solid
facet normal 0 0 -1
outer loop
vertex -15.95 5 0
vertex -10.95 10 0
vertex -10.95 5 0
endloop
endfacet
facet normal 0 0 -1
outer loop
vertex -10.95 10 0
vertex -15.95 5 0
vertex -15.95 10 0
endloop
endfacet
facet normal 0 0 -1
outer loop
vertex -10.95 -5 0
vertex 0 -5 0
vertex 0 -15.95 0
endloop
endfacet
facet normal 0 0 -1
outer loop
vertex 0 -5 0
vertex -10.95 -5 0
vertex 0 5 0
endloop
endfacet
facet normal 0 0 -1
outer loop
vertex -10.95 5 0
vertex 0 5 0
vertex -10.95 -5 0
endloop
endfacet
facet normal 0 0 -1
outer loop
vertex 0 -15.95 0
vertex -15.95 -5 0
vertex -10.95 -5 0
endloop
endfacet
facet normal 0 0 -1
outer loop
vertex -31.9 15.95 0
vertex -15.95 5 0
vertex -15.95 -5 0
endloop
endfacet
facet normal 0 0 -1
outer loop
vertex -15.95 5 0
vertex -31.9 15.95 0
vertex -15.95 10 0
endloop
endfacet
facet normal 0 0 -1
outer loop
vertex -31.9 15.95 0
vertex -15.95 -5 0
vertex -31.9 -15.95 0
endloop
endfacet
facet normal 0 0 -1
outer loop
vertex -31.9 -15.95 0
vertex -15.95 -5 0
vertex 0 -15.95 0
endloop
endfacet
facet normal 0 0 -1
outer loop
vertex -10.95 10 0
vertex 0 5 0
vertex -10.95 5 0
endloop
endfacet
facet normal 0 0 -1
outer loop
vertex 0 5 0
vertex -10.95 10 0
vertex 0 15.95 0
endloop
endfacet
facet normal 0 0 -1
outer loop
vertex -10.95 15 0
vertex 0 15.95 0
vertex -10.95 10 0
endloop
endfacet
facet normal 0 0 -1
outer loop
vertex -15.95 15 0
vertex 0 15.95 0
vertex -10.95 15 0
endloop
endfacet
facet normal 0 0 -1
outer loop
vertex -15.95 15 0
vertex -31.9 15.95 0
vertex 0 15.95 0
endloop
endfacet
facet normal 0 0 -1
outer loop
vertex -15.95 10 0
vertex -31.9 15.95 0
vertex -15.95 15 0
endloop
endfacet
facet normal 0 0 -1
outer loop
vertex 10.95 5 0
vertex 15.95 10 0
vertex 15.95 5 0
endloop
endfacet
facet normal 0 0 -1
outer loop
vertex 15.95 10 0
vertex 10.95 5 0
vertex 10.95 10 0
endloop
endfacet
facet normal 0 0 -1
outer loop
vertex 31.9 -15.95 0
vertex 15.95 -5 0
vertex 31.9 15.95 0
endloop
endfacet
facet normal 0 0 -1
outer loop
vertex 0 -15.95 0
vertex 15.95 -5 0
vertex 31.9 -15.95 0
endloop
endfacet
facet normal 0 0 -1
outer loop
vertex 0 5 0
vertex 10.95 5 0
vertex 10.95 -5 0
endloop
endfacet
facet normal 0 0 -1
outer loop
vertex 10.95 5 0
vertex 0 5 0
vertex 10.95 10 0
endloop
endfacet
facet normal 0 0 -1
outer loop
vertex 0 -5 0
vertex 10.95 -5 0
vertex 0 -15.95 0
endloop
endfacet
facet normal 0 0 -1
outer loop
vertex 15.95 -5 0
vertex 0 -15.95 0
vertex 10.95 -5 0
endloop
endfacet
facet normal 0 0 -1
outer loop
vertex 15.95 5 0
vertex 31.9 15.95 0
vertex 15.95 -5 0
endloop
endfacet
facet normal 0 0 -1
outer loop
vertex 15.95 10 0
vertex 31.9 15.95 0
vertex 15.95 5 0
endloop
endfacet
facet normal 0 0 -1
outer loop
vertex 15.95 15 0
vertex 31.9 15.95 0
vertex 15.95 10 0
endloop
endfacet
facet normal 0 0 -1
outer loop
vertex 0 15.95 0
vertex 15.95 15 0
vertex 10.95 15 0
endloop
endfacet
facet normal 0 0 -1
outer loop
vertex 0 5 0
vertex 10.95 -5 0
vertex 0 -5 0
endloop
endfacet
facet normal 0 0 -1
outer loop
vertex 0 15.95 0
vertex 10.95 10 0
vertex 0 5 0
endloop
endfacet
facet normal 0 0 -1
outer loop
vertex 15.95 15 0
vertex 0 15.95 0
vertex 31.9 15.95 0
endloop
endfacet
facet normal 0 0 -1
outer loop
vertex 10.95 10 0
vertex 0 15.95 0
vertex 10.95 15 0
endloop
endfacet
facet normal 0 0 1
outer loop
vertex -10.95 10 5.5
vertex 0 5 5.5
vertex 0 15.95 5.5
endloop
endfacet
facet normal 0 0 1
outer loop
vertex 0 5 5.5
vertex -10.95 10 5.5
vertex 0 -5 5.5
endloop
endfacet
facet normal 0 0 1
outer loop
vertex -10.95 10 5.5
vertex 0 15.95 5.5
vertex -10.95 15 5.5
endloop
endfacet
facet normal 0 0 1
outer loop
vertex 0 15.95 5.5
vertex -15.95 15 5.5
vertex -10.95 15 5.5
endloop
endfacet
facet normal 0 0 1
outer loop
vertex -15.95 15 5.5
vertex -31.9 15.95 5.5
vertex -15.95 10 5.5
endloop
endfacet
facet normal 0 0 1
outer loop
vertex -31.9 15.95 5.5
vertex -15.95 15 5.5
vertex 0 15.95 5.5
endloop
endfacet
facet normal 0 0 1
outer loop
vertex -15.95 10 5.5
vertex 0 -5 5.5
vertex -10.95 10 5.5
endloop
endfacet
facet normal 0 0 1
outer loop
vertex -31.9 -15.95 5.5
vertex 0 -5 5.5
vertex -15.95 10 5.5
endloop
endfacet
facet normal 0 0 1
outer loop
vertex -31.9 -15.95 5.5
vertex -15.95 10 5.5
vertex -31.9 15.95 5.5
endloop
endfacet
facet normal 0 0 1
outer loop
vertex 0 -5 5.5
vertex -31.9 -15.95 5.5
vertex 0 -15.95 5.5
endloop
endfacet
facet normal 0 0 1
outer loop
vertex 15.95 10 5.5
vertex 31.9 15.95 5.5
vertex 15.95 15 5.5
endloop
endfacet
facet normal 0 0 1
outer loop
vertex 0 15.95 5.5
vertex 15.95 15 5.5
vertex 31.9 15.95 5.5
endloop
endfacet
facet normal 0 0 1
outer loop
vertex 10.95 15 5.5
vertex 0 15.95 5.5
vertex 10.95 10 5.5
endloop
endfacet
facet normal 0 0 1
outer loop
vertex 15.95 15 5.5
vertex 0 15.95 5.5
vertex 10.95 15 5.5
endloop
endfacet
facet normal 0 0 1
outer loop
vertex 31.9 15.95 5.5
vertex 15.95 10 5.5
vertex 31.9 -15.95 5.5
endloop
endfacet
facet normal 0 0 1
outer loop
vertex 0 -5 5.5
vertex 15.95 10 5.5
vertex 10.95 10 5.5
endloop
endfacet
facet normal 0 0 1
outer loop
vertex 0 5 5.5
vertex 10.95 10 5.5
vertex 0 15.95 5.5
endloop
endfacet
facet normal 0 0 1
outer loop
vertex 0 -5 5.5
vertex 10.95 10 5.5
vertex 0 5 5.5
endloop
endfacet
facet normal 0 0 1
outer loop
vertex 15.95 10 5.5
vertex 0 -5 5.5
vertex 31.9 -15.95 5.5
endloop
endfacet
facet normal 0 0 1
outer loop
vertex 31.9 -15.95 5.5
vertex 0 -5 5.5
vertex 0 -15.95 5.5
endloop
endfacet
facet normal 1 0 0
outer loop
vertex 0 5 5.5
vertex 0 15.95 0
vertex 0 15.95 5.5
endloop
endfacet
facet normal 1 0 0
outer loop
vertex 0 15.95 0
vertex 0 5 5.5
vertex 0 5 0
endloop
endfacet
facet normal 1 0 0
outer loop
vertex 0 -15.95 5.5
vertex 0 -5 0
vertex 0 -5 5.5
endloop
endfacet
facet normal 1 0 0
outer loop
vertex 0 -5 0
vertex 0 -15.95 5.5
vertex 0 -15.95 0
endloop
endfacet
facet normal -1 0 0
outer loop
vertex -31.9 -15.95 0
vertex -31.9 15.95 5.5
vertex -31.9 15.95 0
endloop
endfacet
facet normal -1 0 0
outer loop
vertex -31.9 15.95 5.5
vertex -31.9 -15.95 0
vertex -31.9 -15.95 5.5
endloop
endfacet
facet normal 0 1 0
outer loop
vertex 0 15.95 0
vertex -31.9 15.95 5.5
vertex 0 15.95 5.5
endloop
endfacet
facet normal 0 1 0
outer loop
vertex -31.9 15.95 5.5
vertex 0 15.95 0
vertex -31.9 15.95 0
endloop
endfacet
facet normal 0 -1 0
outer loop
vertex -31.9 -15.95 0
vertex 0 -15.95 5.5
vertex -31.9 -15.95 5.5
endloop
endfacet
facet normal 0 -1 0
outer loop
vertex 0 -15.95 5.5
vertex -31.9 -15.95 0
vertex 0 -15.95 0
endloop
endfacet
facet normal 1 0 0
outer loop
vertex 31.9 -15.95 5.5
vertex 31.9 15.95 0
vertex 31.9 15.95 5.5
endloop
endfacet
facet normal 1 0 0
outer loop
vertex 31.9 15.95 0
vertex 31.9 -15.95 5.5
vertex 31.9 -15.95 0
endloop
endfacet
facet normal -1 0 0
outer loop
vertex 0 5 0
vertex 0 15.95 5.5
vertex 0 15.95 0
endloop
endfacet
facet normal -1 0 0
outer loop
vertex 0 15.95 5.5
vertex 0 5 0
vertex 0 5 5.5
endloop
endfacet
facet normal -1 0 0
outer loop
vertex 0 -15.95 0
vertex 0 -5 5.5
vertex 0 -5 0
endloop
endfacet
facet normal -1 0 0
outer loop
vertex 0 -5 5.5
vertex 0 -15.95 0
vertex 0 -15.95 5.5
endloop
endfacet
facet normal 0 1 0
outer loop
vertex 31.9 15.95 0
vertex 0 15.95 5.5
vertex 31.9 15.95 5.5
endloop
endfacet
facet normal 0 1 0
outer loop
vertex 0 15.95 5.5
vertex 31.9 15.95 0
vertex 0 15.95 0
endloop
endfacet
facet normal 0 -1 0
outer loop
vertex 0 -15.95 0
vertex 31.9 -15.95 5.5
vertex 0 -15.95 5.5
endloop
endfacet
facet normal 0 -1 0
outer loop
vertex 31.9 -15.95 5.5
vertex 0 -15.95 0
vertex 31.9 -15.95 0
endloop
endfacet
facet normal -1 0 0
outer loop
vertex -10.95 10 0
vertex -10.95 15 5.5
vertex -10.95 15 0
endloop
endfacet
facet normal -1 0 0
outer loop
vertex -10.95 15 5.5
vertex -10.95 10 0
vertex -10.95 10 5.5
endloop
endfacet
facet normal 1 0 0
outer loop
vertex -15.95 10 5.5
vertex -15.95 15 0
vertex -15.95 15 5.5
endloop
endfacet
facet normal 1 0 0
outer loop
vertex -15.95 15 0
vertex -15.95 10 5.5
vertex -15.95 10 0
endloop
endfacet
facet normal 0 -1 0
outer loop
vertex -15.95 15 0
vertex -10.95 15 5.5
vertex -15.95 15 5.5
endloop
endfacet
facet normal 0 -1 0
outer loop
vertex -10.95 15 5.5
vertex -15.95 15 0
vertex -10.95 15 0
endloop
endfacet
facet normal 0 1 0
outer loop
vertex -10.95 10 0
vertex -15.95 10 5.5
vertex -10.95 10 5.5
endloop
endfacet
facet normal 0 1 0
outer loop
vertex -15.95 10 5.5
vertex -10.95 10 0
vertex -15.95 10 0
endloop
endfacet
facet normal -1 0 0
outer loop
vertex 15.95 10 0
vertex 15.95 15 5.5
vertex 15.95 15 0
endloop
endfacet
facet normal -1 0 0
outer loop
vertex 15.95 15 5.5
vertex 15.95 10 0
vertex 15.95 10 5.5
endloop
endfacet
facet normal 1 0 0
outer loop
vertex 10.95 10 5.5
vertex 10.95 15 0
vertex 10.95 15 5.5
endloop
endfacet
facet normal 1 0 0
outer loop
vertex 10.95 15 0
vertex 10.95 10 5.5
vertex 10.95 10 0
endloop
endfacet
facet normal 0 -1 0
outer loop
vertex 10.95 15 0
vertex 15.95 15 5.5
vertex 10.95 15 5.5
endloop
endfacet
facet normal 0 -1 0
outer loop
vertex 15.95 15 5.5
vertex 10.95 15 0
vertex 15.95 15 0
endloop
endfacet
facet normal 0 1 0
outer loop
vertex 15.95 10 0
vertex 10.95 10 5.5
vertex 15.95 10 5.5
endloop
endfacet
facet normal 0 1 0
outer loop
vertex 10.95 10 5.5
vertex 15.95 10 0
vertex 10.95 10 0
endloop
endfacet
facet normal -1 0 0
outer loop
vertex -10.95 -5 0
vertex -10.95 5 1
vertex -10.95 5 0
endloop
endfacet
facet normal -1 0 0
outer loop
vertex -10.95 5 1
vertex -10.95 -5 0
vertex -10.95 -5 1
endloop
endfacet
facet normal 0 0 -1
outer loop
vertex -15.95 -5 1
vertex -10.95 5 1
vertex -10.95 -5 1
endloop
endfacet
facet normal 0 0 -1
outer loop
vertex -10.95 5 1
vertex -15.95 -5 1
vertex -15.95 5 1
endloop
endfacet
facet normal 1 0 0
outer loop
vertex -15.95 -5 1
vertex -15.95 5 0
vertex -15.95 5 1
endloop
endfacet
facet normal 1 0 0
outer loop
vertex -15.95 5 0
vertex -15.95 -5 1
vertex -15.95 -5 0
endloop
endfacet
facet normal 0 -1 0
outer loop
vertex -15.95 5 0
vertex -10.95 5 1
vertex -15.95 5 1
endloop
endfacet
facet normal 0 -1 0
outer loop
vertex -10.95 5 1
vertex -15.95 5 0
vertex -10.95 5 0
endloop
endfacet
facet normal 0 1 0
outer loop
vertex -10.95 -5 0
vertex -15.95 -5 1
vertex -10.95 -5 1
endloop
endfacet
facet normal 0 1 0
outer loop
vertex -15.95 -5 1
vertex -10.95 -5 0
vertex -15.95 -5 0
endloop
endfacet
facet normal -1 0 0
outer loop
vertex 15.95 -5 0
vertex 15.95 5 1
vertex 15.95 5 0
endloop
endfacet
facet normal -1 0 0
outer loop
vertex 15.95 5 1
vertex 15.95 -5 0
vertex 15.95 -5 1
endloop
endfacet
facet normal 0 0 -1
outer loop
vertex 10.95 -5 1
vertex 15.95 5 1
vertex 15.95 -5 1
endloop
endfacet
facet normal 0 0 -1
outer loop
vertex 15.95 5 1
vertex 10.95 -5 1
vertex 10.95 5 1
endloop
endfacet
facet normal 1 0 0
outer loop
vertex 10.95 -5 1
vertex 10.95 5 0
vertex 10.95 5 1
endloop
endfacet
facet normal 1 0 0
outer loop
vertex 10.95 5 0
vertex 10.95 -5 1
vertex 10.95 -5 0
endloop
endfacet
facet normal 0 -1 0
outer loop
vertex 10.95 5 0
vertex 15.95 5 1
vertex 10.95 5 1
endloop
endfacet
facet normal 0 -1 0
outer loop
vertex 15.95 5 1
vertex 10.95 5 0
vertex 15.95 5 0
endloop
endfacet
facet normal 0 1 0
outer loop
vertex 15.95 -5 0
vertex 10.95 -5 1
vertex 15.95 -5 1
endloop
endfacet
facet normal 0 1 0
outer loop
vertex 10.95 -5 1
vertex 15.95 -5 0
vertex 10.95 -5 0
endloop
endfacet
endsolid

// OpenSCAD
module dog_bone_link_plate() {
    difference() {
        union() {
            // Left rounded-end tab
            translate([-15.95, 0, 0])
            union() {
                cylinder(h=5.5, r=15.95, $fn=64);
                translate([-15.95, -15.95, 0])
                cube([31.9, 31.9, 5.5]);
            }
            
            // Right rounded-end tab
            translate([15.95, 0, 0])
            union() {
                cylinder(h=5.5, r=15.95, $fn=64);
                translate([-15.95, -15.95, 0])
                cube([31.9, 31.9, 5.5]);
            }
            
            // Central web
            translate([-15.95, -5, 0])
            cube([31.9, 10, 5.5]);
        }
        
        // Left square through-hole
        translate([-15.95, 10, -1])
        cube([5, 5, 7.5]);
        
        // Right square through-hole
        translate([10.95, 10, -1])
        cube([5, 5, 7.5]);
        
        // Left rectangular recess
        translate([-15.95, -5, 0])
        cube([5, 10, 1]);
        
        // Right rectangular recess
        translate([10.95, -5, 0])
        cube([5, 10, 1]);
    }
}

dog_bone_link_plate();
